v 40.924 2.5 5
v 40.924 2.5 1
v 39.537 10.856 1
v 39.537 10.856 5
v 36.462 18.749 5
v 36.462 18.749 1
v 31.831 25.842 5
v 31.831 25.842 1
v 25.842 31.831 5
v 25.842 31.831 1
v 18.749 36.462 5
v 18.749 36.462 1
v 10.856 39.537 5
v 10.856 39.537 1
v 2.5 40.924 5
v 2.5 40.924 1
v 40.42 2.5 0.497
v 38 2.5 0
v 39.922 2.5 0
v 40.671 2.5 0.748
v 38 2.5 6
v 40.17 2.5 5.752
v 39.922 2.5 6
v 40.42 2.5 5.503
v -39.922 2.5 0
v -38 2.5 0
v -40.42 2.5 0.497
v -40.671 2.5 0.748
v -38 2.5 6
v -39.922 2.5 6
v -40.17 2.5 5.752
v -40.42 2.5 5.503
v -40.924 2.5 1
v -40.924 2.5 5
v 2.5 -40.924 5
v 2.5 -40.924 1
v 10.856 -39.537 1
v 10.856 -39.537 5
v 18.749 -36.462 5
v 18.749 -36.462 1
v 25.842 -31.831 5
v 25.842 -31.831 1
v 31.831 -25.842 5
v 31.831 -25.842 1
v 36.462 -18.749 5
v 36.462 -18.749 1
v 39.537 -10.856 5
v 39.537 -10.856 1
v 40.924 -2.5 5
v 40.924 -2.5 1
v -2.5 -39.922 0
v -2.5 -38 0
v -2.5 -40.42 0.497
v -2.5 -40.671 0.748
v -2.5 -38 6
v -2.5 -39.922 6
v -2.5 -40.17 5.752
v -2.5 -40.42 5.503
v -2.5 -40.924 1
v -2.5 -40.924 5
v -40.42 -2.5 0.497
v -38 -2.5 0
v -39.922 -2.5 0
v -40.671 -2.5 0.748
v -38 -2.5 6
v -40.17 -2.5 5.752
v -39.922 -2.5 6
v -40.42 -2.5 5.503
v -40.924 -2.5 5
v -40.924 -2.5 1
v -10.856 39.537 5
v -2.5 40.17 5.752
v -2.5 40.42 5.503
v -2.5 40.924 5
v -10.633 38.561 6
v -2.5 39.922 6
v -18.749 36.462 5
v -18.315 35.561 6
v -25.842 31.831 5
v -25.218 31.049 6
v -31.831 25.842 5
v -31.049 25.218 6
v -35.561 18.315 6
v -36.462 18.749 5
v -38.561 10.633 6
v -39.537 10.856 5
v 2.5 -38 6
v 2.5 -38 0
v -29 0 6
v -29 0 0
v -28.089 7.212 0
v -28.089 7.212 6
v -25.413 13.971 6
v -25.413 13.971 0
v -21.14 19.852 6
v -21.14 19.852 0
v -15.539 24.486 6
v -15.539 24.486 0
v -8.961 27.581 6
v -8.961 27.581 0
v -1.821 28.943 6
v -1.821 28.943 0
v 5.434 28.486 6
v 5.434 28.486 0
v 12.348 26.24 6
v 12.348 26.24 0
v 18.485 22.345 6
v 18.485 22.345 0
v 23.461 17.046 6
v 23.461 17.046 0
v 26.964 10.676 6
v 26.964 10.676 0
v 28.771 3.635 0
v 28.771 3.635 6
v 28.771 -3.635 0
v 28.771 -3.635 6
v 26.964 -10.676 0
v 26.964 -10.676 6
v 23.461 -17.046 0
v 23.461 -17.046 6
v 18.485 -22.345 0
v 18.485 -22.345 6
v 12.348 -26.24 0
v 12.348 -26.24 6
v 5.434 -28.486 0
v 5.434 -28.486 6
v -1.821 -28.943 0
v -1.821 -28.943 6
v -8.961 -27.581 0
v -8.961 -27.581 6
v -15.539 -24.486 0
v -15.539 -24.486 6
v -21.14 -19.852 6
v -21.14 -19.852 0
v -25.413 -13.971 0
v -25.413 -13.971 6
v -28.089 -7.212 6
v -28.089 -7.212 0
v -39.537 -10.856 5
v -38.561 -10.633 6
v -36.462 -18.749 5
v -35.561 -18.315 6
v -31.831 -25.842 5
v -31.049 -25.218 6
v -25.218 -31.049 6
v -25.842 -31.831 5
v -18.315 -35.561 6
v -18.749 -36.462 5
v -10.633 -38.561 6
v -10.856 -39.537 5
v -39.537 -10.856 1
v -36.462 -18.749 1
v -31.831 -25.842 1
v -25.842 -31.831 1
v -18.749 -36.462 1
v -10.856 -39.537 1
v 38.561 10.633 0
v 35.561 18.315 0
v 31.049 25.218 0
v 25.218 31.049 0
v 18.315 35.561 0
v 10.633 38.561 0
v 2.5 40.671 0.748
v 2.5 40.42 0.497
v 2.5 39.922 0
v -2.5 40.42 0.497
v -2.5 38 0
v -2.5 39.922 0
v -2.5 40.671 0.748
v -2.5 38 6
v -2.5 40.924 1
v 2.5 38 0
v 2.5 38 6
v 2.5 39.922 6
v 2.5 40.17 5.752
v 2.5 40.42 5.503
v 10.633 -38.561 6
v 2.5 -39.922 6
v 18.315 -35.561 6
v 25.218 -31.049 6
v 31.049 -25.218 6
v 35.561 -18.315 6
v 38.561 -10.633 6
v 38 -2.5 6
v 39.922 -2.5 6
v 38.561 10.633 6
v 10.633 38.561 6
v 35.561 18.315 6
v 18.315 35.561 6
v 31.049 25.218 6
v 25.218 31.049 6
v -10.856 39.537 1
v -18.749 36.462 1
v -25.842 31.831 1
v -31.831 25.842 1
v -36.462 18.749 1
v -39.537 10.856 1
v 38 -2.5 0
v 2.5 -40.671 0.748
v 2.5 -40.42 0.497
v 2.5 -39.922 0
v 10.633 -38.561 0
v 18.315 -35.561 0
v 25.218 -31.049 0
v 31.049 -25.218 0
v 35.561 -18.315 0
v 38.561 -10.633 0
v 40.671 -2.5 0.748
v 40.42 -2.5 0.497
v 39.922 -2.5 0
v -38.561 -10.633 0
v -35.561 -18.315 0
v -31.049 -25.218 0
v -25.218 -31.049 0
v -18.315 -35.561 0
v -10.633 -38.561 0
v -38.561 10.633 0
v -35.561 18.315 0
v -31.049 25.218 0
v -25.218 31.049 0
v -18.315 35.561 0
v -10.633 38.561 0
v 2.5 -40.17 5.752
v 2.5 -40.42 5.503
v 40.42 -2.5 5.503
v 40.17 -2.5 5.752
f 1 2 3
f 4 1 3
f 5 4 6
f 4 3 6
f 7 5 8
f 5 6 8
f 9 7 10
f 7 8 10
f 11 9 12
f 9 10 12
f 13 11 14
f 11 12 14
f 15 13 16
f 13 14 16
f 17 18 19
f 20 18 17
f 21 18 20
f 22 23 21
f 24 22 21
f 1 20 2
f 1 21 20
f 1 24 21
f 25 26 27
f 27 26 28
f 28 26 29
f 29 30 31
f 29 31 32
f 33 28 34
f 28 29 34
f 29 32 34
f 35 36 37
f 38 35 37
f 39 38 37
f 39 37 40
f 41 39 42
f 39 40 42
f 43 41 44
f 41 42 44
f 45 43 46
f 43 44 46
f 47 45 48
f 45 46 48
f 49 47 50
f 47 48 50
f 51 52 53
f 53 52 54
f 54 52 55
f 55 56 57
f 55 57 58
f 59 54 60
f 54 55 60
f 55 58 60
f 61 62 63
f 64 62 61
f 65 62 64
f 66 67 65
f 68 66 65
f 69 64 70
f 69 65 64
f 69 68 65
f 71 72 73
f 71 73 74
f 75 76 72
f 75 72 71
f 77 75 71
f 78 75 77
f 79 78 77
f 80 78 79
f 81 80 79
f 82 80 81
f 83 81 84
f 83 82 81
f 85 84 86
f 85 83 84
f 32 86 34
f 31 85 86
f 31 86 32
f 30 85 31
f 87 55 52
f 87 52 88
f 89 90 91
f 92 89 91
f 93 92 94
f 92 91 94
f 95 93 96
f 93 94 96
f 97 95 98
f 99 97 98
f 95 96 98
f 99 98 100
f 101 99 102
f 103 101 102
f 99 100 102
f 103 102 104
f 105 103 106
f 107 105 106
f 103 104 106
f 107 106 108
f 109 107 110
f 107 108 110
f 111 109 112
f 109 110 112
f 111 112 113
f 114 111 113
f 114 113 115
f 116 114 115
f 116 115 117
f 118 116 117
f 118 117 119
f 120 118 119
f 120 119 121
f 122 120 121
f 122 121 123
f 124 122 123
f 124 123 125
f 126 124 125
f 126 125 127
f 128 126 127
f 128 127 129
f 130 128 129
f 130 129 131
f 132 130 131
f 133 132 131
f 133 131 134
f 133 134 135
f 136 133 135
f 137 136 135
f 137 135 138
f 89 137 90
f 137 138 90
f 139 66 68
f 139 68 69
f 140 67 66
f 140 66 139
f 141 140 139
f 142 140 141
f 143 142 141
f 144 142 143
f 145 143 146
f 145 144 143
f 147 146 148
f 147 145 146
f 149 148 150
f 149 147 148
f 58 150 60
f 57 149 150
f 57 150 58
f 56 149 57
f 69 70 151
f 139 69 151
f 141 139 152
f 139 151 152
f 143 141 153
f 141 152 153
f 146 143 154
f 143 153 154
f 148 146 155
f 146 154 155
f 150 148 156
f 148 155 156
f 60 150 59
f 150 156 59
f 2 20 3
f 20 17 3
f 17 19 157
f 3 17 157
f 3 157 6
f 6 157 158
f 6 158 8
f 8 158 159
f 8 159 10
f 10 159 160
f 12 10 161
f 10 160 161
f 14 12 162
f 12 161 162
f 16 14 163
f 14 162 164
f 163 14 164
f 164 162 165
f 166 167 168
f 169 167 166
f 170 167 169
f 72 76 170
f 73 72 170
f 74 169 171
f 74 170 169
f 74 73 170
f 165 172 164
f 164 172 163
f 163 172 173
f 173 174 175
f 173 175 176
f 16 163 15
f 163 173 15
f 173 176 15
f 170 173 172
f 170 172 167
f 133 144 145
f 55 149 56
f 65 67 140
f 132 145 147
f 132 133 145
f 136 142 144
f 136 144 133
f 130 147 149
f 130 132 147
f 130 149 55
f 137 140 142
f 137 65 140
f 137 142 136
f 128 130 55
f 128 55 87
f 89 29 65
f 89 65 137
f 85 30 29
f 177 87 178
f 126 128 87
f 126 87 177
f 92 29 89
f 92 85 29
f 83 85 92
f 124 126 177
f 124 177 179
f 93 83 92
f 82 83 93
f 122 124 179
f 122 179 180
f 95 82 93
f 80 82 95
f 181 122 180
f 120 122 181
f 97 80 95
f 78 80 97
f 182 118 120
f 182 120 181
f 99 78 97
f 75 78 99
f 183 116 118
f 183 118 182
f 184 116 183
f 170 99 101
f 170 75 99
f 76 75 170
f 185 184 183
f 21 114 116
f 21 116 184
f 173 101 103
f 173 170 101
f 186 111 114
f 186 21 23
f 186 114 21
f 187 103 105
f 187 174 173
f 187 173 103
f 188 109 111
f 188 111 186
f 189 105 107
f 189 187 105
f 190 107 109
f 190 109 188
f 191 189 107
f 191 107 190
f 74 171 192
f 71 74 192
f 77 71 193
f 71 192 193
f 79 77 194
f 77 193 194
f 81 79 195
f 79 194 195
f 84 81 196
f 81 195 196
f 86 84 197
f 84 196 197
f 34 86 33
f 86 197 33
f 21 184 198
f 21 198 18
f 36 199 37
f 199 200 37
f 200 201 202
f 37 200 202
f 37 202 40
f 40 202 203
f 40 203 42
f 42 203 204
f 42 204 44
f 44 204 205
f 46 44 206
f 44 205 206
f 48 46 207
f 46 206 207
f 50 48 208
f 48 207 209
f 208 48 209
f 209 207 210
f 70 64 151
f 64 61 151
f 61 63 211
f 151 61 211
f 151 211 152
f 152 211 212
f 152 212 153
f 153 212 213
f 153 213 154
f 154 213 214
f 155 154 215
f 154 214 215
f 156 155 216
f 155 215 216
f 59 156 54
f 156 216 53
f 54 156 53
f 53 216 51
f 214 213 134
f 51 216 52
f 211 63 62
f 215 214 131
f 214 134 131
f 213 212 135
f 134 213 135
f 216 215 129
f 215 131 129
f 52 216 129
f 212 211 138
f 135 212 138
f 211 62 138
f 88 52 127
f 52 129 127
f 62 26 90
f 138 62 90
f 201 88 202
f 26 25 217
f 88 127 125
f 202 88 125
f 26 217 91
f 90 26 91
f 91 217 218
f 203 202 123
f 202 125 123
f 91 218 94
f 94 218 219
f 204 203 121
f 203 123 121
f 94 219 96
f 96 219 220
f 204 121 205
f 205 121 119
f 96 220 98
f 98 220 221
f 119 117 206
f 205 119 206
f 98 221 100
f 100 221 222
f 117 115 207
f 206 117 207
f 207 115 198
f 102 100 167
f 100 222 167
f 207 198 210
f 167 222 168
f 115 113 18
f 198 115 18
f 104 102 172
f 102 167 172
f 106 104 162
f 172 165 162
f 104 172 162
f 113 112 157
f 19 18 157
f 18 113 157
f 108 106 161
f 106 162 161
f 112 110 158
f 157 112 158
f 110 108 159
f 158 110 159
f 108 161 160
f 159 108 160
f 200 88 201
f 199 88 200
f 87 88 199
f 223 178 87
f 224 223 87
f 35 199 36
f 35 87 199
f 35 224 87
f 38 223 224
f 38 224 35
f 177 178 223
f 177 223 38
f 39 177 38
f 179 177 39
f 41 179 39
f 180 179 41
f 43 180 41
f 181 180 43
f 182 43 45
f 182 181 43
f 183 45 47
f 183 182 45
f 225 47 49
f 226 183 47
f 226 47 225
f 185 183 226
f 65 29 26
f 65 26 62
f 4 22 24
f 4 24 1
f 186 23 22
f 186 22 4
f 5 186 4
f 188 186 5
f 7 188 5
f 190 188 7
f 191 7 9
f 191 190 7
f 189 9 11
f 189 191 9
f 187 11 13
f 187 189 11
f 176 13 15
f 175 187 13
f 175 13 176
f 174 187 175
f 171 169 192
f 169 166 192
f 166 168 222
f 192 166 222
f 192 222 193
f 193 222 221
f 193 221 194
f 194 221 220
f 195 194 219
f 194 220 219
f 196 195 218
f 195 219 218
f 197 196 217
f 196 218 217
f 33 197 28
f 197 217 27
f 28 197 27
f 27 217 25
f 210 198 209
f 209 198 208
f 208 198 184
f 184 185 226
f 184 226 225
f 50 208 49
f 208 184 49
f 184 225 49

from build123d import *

# Parameters (mm, degrees)
SKETCH_1_R               = 41
EXTRUDE_1_DEPTH          = 6
HOLE_WIZARD_M64_1_D      = 58
CHAMFER_1_SIZE           = 1
SKETCH_5_W               = 3
SKETCH_5_H               = 5
CUT_EXTRUDE_1_DEPTH      = 59.292366567
PATTERN_CIRCULAR_1_COUNT = 4


with BuildPart() as part:
    # 草图1 → 凸台-拉伸1 (new body)
    with BuildSketch(Plane.XY):
        Circle(SKETCH_1_R)
    extrude(amount=EXTRUDE_1_DEPTH)

    # M64 螺纹孔1 (through all)
    with Locations(Plane.XY.offset(6)):
        with Locations((0, 0)):
            Hole(HOLE_WIZARD_M64_1_D / 2)

    # 倒角1
    chamfer_1_edges = [part.edges().sort_by_distance(p)[0] for p in [
        (-41, 0, 0),
        (-41, 0, 6),
    ]]
    chamfer(chamfer_1_edges, length=CHAMFER_1_SIZE)

    # 草图5 → 切除-拉伸1 (cut, through all)
    with BuildSketch(Plane.XY.offset(6)):
        with Locations((39.5, 0)):
            Rectangle(SKETCH_5_W, SKETCH_5_H)
    cut_extrude_1 = extrude(amount=-CUT_EXTRUDE_1_DEPTH, mode=Mode.SUBTRACT)

    # 阵列(圆周)1: 切除-拉伸1 ×4 about axis
    pattern_circular_1_axis = Axis((0, 0, 0), (0, 0, 1))
    for i in range(1, PATTERN_CIRCULAR_1_COUNT):
        add(cut_extrude_1.rotate(pattern_circular_1_axis, i * 360 / PATTERN_CIRCULAR_1_COUNT), mode=Mode.SUBTRACT)


solid = part.part
